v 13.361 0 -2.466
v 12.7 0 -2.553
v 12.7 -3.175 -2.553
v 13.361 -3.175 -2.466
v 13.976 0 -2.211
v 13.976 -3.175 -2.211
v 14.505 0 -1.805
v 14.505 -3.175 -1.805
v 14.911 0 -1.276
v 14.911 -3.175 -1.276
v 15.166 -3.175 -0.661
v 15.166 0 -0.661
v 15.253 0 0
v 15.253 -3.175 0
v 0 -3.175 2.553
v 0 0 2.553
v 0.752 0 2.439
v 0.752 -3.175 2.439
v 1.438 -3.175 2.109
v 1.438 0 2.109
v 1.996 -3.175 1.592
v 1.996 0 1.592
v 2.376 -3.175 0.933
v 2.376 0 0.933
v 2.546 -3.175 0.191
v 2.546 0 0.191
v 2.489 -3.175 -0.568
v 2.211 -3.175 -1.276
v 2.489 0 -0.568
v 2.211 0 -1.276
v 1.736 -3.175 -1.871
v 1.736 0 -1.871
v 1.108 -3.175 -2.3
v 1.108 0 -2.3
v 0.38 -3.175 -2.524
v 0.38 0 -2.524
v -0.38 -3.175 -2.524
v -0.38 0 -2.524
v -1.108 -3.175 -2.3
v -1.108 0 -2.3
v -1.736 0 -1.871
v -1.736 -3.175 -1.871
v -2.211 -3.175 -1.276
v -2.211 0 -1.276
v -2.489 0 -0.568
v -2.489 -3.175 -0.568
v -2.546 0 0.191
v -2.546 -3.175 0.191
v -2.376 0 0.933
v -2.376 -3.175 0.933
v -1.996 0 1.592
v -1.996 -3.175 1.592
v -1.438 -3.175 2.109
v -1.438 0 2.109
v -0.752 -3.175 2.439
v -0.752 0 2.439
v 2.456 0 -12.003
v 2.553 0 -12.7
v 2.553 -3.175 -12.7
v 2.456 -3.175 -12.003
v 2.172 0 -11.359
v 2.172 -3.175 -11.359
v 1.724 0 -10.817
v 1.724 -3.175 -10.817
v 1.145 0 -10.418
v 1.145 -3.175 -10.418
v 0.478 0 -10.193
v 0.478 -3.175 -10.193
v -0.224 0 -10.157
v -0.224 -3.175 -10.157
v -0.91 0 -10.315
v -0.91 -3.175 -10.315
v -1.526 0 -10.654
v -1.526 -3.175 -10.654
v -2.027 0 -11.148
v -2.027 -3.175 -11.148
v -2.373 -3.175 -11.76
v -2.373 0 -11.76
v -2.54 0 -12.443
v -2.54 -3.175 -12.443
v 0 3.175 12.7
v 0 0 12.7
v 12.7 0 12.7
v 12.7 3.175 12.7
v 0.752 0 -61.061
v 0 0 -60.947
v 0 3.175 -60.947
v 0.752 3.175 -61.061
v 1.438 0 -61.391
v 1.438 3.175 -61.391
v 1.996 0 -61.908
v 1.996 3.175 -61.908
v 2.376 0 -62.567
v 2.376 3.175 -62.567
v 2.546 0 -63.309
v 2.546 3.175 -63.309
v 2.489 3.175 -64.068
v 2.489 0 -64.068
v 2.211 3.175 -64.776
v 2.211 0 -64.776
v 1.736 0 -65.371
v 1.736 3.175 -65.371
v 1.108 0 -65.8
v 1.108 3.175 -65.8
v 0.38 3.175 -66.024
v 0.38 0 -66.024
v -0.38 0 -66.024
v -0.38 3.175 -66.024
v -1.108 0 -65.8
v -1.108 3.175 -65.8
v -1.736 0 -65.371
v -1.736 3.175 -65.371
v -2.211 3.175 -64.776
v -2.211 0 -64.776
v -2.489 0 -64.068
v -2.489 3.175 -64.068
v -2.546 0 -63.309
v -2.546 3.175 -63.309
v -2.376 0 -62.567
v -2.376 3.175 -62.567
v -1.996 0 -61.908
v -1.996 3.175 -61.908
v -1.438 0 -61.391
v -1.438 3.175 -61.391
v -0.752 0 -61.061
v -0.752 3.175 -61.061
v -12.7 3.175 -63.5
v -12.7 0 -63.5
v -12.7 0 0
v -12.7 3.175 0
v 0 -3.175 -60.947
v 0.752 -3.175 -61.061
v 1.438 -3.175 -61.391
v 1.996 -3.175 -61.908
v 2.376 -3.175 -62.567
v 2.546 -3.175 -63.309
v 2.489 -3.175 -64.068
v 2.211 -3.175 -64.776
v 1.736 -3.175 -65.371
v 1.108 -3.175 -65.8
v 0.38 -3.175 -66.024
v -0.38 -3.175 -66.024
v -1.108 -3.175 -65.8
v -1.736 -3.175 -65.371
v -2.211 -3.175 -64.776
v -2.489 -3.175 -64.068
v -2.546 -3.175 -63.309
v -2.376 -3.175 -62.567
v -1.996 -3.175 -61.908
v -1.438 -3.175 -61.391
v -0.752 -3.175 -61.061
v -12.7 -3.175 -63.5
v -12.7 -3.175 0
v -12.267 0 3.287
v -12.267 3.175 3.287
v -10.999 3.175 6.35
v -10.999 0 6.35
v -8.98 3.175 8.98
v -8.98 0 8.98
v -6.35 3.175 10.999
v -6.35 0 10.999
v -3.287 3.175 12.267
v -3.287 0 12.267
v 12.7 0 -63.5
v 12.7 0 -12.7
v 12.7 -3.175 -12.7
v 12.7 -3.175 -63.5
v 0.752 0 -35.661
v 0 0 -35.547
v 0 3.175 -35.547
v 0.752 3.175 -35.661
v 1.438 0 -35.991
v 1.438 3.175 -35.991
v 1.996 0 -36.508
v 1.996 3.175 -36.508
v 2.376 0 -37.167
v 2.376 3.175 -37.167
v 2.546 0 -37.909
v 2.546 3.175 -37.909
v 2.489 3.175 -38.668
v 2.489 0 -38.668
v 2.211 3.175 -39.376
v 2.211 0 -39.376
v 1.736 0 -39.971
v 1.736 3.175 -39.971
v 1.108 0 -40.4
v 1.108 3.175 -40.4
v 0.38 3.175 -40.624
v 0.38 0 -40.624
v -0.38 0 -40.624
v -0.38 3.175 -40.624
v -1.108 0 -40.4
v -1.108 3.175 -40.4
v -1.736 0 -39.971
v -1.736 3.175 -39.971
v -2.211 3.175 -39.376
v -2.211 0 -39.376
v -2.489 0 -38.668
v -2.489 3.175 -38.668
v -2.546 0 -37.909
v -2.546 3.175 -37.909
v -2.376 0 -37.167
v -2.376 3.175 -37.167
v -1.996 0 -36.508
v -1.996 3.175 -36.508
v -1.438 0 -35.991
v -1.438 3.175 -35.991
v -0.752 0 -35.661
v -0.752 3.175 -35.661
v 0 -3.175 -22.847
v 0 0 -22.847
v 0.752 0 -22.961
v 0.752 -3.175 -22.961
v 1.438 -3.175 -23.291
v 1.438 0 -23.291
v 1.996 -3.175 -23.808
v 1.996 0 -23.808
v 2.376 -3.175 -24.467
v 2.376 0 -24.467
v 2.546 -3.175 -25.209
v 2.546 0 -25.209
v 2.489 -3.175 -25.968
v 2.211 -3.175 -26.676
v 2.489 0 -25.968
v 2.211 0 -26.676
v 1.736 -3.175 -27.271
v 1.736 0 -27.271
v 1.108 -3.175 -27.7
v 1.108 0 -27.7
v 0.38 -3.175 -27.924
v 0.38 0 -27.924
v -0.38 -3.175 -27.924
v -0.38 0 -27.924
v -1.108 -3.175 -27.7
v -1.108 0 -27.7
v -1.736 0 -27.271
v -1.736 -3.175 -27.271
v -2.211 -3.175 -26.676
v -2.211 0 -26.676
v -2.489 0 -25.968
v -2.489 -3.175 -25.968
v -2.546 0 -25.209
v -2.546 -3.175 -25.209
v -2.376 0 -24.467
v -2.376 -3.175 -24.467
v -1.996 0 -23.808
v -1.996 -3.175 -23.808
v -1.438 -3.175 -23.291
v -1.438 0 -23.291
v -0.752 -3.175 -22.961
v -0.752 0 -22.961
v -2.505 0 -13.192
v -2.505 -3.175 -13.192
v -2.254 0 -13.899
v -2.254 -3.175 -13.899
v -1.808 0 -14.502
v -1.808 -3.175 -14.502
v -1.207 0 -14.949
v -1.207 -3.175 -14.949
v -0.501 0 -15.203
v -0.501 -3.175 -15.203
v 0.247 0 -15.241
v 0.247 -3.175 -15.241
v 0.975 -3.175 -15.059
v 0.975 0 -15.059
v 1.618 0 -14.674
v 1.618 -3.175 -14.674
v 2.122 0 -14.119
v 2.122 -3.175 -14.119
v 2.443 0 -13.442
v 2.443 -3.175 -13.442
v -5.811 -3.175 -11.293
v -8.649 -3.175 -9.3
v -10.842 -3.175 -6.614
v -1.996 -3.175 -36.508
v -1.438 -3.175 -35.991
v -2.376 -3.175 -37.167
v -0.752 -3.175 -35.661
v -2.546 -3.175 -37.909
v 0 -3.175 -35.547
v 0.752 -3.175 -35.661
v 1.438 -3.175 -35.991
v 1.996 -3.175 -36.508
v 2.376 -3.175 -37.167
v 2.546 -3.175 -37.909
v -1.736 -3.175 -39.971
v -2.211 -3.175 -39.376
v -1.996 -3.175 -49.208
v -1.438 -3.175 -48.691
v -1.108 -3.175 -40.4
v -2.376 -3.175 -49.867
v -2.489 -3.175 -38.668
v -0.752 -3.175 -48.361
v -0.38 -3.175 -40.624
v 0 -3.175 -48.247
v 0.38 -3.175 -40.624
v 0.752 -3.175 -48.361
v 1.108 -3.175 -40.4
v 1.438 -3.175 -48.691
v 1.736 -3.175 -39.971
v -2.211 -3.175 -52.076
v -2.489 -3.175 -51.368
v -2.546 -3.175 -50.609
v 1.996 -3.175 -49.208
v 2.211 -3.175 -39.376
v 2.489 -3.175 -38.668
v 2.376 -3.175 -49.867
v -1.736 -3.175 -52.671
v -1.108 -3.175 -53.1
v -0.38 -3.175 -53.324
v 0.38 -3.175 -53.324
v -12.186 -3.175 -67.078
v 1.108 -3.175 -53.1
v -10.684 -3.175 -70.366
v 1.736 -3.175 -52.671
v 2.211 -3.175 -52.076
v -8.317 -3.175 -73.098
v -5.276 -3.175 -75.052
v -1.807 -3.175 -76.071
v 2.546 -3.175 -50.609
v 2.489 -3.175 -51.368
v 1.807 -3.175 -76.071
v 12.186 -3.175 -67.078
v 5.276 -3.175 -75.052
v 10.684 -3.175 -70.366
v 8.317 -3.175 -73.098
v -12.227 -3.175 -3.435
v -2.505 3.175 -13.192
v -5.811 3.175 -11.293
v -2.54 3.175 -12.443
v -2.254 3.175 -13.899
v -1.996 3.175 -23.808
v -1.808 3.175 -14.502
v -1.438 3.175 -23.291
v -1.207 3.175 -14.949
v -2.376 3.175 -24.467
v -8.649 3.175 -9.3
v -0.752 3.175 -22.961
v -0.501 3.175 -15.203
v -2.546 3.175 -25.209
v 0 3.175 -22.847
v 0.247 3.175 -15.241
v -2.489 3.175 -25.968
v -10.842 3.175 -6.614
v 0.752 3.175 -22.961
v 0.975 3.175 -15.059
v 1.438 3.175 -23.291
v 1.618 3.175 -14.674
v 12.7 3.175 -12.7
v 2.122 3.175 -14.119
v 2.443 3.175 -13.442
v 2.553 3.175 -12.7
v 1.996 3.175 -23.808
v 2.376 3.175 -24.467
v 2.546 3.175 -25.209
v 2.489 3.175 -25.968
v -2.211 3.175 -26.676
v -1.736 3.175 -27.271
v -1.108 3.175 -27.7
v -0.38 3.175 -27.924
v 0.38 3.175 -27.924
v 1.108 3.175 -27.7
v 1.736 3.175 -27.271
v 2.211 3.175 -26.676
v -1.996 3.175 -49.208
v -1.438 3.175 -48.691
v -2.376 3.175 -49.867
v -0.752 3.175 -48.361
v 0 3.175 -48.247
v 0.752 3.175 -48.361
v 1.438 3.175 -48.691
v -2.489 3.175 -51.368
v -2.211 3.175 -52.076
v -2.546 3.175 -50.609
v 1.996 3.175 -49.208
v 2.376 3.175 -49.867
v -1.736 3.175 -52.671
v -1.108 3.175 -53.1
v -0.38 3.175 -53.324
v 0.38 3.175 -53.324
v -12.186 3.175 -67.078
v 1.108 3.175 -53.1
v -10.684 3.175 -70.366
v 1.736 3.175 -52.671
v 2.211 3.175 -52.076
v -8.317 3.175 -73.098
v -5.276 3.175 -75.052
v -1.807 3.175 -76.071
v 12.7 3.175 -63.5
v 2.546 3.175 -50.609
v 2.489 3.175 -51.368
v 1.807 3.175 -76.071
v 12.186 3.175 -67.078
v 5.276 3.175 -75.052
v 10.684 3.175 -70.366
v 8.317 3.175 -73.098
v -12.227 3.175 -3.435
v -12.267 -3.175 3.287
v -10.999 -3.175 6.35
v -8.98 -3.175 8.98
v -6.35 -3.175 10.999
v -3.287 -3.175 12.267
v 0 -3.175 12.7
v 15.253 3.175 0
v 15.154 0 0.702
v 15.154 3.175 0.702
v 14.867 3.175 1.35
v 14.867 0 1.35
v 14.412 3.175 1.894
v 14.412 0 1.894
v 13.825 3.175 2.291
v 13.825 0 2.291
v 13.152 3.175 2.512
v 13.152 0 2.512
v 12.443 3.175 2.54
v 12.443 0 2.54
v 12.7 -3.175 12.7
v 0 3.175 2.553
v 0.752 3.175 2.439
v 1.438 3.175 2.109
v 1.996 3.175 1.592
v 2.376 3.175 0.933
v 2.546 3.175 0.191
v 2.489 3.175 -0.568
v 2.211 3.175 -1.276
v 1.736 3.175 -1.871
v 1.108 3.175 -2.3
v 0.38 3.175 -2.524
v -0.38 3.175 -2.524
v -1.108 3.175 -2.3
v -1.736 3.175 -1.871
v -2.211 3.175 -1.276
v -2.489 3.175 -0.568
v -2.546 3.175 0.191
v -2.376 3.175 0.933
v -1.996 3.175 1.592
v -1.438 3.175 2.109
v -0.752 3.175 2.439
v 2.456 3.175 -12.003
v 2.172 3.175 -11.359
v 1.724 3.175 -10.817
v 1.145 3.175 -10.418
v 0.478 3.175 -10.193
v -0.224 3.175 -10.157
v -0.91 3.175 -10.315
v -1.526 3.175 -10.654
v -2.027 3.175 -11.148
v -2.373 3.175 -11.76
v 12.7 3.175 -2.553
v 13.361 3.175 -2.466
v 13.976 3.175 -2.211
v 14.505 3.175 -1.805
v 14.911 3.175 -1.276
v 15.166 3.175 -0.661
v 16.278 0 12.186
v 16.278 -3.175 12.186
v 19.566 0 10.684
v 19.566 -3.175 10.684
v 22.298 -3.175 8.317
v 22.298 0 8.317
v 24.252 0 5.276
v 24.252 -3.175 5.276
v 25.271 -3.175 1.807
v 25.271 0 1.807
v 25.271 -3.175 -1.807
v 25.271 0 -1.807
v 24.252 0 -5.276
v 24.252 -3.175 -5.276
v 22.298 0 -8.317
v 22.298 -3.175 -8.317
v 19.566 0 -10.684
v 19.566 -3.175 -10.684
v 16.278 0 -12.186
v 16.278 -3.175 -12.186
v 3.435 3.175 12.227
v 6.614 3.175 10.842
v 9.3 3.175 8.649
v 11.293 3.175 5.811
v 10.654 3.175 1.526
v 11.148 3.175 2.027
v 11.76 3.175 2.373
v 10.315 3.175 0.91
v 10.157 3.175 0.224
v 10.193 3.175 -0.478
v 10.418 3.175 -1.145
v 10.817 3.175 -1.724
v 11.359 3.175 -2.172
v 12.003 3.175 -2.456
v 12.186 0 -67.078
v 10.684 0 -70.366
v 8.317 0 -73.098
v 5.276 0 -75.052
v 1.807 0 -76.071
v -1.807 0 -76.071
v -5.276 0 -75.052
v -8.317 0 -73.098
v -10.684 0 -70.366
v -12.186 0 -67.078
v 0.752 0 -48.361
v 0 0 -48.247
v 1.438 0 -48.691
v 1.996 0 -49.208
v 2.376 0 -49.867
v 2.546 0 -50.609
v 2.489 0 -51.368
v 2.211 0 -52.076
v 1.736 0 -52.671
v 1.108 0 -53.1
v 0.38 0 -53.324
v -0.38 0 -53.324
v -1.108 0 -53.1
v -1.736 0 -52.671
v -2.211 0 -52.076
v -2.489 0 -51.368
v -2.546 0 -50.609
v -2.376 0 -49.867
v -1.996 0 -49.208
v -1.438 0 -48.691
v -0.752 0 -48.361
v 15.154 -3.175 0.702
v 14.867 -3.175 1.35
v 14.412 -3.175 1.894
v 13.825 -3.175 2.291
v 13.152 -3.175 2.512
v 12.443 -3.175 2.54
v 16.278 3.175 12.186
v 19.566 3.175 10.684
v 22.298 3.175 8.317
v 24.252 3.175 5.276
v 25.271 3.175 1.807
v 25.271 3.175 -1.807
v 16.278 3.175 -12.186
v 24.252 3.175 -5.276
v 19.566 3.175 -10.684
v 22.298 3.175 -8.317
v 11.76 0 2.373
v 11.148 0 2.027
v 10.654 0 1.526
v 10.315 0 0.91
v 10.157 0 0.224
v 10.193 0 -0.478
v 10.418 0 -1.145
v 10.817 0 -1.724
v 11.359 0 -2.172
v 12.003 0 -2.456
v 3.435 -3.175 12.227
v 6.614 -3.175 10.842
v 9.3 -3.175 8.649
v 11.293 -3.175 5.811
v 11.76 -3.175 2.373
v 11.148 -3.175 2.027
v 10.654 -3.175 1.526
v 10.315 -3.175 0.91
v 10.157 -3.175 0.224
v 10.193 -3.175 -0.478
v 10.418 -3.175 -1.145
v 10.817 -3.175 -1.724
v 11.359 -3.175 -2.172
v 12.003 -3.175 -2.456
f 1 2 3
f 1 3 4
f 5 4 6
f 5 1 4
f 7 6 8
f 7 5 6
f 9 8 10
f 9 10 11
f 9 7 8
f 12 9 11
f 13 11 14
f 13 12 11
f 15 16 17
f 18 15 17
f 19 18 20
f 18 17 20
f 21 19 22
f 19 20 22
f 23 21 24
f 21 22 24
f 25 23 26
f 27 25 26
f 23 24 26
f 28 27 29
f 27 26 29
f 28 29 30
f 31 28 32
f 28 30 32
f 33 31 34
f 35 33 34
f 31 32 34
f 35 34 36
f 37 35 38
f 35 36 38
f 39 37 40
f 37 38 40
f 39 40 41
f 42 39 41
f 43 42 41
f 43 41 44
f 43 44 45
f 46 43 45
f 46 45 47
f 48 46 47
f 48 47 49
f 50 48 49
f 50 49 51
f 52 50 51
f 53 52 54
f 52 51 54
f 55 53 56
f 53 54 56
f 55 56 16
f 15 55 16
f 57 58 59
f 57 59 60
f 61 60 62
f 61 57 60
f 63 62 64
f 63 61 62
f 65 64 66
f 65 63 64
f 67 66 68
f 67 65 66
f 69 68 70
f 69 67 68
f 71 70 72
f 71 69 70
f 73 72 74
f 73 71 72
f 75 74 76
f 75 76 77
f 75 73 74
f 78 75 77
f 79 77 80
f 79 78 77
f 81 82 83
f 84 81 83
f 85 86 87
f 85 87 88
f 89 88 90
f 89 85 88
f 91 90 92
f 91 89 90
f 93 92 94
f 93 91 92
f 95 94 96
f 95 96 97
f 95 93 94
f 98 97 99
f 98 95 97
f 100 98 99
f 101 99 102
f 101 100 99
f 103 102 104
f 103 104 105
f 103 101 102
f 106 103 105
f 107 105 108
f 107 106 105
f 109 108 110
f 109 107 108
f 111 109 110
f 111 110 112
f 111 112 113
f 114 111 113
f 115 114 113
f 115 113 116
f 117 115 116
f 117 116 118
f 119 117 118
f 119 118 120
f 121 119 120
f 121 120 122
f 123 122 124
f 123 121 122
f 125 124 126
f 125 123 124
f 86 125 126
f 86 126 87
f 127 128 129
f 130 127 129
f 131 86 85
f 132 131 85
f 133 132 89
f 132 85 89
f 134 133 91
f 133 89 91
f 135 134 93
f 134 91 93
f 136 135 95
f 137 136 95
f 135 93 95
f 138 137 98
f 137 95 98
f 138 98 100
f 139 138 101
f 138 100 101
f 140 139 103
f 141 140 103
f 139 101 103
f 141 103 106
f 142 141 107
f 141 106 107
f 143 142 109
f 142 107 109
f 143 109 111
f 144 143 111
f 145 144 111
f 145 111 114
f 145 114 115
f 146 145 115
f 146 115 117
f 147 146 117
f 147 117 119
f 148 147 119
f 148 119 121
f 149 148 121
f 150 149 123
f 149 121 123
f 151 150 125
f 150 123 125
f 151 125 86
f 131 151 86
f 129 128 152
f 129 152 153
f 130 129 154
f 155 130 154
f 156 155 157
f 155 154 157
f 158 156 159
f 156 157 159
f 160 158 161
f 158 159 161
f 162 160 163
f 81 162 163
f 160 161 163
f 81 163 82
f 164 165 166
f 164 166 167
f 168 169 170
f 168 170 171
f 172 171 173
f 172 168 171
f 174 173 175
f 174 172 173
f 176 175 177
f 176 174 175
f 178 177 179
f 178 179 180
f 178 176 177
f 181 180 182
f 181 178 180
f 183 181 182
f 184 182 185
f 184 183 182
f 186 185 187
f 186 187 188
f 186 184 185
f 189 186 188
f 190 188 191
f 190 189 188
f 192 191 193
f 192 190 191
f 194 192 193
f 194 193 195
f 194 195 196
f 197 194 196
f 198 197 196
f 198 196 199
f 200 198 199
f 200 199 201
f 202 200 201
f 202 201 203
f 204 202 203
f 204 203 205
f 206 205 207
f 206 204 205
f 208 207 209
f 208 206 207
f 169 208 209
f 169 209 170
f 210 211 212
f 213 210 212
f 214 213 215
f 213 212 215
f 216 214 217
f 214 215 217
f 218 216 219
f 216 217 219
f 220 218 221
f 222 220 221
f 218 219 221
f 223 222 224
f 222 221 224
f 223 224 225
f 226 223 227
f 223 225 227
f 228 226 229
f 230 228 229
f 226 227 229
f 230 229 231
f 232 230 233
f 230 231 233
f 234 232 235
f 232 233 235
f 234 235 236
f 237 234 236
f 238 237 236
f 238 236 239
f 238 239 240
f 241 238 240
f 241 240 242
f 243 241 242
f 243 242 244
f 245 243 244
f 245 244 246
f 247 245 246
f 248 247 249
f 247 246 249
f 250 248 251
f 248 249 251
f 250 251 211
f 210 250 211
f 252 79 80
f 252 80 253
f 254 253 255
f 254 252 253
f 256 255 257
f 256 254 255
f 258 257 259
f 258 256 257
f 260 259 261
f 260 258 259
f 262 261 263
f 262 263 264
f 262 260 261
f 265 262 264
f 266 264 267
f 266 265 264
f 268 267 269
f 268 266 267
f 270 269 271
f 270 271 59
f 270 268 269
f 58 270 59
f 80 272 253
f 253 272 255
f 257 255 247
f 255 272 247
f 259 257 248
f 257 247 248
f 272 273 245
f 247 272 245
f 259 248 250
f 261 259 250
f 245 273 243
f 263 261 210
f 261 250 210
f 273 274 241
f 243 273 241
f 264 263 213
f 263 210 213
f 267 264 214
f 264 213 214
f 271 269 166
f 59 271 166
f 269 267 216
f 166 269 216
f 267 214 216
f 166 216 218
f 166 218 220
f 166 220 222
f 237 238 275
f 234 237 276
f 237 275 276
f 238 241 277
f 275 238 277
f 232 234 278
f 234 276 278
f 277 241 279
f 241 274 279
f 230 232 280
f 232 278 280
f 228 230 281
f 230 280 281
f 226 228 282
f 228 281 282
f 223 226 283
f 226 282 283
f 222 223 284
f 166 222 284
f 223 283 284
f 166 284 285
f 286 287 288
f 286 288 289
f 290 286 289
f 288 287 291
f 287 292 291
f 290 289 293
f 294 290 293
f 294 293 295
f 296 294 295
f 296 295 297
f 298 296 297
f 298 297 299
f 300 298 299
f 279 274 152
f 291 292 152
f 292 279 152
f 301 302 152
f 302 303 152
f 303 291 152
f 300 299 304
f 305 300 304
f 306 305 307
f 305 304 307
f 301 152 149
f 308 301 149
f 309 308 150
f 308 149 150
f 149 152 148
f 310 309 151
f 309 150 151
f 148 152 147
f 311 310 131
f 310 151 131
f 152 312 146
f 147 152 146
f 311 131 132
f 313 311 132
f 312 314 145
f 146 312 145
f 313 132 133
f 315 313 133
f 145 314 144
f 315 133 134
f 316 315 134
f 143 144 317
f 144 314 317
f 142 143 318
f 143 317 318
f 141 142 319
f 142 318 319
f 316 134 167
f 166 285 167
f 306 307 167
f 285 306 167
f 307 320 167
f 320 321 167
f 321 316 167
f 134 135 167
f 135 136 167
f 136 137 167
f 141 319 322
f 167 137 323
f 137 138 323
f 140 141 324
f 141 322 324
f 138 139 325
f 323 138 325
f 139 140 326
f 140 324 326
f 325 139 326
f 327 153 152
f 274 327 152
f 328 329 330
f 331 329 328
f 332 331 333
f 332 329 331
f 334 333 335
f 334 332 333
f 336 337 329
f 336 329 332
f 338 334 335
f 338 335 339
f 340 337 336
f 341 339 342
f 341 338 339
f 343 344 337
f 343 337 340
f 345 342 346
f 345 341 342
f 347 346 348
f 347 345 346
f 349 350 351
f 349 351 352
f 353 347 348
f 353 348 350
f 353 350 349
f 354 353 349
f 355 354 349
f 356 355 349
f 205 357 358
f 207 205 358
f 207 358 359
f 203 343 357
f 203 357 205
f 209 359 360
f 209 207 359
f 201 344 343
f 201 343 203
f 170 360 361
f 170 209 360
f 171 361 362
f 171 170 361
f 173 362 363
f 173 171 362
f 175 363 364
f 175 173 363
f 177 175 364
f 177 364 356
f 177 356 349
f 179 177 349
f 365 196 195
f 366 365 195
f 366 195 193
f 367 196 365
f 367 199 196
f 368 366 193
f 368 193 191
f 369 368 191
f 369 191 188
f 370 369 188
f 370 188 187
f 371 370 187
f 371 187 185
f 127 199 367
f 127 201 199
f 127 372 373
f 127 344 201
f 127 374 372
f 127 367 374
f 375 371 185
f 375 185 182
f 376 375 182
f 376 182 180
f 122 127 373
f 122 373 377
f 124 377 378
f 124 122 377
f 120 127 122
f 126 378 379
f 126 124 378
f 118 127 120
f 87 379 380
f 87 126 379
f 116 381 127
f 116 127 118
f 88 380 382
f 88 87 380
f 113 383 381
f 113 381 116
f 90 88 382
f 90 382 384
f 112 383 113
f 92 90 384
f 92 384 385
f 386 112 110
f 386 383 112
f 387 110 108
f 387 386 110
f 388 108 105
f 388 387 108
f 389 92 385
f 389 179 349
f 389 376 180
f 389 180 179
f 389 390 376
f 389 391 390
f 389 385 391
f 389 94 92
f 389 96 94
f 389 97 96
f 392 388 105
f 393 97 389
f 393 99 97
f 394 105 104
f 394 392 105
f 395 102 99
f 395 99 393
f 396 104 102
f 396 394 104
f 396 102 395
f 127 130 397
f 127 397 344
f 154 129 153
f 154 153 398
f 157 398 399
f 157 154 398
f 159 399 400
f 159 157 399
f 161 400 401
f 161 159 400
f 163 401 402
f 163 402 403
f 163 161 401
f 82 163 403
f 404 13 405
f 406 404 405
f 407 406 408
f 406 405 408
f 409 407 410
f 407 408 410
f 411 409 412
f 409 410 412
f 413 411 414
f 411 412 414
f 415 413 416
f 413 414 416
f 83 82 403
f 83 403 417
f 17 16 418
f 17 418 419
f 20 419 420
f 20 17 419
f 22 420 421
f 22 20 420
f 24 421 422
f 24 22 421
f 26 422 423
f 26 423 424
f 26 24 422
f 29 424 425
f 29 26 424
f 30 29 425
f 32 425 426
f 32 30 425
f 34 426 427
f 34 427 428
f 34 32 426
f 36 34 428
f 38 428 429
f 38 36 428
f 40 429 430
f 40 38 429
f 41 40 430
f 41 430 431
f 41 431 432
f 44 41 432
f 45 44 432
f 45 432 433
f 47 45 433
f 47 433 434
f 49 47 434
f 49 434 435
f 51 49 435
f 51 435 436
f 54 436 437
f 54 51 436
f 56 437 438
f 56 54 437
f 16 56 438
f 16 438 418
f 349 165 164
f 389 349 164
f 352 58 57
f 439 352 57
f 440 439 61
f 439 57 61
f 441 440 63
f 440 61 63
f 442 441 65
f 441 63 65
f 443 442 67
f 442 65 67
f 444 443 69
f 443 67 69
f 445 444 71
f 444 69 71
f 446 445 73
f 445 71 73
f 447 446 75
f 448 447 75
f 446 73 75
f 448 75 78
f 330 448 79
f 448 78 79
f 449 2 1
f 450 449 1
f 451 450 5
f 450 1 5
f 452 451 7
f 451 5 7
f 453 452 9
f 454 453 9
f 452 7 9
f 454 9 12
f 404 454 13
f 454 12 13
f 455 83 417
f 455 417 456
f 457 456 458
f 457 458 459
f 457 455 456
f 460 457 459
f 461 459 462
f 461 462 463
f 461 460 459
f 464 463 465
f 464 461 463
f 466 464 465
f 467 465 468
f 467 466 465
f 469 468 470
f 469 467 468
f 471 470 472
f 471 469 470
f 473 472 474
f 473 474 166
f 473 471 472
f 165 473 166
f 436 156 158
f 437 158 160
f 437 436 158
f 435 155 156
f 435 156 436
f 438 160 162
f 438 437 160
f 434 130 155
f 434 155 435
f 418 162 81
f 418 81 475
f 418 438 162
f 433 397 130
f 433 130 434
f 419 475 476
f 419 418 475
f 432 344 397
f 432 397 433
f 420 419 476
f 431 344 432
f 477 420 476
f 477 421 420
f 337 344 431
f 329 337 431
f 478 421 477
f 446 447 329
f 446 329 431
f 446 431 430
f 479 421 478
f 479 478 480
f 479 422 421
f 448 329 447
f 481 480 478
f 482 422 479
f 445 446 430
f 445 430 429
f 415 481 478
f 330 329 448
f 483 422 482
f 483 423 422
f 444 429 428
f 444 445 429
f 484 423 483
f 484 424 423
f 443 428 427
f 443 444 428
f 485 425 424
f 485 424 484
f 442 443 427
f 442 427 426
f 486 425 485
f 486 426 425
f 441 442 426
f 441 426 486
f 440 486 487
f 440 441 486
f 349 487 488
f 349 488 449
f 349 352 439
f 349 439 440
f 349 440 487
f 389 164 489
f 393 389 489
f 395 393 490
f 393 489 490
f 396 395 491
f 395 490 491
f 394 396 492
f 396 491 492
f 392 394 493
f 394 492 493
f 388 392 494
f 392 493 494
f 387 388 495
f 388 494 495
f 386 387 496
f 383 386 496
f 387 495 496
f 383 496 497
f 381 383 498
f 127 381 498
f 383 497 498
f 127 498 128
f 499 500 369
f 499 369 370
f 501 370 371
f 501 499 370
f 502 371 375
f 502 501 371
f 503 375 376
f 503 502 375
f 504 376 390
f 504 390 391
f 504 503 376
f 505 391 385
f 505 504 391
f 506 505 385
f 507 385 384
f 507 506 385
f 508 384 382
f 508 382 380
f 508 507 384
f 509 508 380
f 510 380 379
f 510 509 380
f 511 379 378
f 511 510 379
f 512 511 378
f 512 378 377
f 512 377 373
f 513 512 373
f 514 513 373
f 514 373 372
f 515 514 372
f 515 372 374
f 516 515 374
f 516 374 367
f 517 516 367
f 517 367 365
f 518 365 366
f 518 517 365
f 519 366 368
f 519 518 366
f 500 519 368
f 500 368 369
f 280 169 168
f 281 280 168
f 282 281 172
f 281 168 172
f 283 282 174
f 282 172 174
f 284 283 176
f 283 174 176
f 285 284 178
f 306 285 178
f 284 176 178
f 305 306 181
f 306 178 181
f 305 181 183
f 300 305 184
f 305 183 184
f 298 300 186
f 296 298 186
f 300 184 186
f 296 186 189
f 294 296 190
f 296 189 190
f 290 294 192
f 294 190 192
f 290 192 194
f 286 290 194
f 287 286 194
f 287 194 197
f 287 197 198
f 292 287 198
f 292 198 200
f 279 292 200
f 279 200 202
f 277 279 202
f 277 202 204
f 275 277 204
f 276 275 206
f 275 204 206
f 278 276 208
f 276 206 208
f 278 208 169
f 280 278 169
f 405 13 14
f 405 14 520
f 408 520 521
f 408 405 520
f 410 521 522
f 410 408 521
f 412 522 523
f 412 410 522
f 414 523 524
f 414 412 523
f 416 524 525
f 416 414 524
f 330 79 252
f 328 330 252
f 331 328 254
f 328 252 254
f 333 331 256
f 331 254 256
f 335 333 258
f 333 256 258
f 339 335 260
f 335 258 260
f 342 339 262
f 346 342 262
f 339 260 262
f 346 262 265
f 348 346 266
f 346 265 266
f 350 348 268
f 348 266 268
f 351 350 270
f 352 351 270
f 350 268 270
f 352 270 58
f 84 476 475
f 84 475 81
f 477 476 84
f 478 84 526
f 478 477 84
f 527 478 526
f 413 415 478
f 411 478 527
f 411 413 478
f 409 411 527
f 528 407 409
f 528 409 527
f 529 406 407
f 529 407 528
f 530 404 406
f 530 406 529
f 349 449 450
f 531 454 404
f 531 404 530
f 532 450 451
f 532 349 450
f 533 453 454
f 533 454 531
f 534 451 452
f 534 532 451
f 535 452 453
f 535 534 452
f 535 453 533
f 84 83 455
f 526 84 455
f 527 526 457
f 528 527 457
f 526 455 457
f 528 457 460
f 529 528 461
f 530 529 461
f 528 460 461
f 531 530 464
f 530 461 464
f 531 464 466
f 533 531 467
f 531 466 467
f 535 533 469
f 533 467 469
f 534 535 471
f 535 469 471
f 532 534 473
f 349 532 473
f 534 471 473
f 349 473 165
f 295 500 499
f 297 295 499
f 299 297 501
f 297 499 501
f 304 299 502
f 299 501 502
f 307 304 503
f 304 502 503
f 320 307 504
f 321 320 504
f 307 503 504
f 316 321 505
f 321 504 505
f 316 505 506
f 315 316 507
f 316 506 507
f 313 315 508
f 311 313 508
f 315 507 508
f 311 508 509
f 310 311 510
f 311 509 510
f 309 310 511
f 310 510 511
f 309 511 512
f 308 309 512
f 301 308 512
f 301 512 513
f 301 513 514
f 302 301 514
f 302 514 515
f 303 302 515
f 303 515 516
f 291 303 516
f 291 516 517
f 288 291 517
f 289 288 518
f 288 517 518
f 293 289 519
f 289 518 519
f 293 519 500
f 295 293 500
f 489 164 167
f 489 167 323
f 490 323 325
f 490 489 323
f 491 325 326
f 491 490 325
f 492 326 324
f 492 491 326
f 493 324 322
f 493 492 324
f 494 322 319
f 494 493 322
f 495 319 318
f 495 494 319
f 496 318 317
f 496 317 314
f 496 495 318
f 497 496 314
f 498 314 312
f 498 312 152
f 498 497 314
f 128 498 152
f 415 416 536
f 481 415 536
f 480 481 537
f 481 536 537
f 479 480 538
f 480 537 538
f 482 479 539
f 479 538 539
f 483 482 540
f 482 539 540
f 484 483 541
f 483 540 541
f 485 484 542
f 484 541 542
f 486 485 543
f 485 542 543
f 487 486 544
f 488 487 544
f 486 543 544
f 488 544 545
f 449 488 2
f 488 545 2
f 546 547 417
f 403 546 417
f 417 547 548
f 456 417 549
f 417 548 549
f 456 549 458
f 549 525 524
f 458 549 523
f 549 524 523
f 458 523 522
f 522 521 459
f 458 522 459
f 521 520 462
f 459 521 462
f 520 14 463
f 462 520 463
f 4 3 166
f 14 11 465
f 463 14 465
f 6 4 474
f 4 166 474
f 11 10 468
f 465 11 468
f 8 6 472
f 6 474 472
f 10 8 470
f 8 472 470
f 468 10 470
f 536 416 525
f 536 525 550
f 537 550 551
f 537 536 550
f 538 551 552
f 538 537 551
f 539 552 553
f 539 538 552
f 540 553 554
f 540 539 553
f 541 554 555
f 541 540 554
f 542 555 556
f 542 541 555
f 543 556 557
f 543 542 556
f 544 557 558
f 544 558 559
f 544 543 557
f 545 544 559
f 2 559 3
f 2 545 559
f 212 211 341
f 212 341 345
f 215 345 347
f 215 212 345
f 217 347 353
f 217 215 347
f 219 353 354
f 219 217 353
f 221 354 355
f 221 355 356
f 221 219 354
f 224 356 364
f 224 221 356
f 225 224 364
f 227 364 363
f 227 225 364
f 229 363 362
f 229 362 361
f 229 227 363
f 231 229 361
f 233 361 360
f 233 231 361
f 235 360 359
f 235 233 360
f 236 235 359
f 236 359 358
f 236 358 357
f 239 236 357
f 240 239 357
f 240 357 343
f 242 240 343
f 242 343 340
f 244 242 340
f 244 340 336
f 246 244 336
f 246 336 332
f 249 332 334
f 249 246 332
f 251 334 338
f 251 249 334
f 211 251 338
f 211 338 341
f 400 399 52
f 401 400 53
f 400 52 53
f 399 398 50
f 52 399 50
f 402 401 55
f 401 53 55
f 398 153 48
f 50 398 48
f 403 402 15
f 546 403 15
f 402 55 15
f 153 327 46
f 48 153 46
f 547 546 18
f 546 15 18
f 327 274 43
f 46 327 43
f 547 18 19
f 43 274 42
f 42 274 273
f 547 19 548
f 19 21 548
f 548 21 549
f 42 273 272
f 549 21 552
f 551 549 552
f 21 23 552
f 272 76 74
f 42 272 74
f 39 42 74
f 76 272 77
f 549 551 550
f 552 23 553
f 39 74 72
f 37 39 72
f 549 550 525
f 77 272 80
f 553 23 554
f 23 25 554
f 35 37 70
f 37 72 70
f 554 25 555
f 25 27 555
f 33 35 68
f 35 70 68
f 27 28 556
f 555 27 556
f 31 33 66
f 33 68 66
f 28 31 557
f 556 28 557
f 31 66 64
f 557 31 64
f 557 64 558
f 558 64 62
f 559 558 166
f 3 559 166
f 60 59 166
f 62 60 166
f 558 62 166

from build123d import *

# Parameters (mm, degrees)
SKETCH1_R           = 2.5527
BOSS_EXTRUDE1_DEPTH = 3.175


with BuildPart() as part:
    # Sketch1 → Boss-Extrude1 (new, symmetric)
    # profile 1 of 3: a face of its own
    with BuildSketch(Plane(origin=(0, 0, 0), x_dir=(1, 0, 0), z_dir=(0, 1, 0))):
        with BuildLine():
            Line((0, -12.7), (12.7, -12.7))
            ThreePointArc((12.7, -12.7), (25.4, 0), (12.7, 12.7))
            Line((12.7, 12.7), (12.7, 2.5527))
            ThreePointArc((12.7, 2.5527), (14.50503148, 1.80503148), (15.2527, 0))
            ThreePointArc((15.2527, 0), (14.411927484, -1.893563196), (12.44345365, -2.539775829))
            ThreePointArc((12.44345365, -2.539775829), (8.032273868, -9.837305348), (0, -12.7))
        make_face()
    # profile 2 of 3: a face of its own
    with BuildSketch(Plane(origin=(0, 0, 0), x_dir=(1, 0, 0), z_dir=(0, 1, 0))):
        with BuildLine():
            ThreePointArc((-12.7, 0), (-8.980256121, -8.980256121), (0, -12.7))
            ThreePointArc((0, -12.7), (8.032273868, -9.837305348), (12.44345365, -2.539775829))
            ThreePointArc((12.44345365, -2.539775829), (10.15053309, 0.128435844), (12.7, 2.5527))
            Line((12.7, 2.5527), (12.7, 12.7))
            Line((12.7, 12.7), (2.5527, 12.7))
            ThreePointArc((2.5527, 12.7), (0.128435844, 10.15053309), (-2.539775829, 12.44345365))
            ThreePointArc((-2.539775829, 12.44345365), (-9.837305348, 8.032273868), (-12.7, 0))
        make_face()
        with Locations(Location((0, 0, 0), (0, 0, 270))):
            Circle(SKETCH1_R, mode=Mode.SUBTRACT)
    # profile 3 of 3: a face of its own
    with BuildSketch(Plane(origin=(0, 0, 0), x_dir=(1, 0, 0), z_dir=(0, 1, 0))):
        with BuildLine():
            Line((2.5527, 12.7), (12.7, 12.7))
            Line((12.7, 12.7), (12.7, 63.5))
            ThreePointArc((12.7, 63.5), (0, 76.2), (-12.7, 63.5))
            Line((-12.7, 63.5), (-12.7, 0))
            ThreePointArc((-12.7, 0), (-9.837305348, 8.032273868), (-2.539775829, 12.44345365))
            ThreePointArc((-2.539775829, 12.44345365), (-0.128435844, 15.24946691), (2.5527, 12.7))
        make_face()
        with Locations(Location((0, 25.4, 0), (0, 0, 270))):
            Circle(SKETCH1_R, mode=Mode.SUBTRACT)
        with Locations(Location((0, 38.1, 0), (0, 0, 270))):
            Circle(SKETCH1_R, mode=Mode.SUBTRACT)
        with Locations(Location((0, 50.8, 0), (0, 0, 270))):
            Circle(SKETCH1_R, mode=Mode.SUBTRACT)
        with Locations(Location((0, 63.5, 0), (0, 0, 270))):
            Circle(SKETCH1_R, mode=Mode.SUBTRACT)
    extrude(amount=BOSS_EXTRUDE1_DEPTH, both=True)


solid = part.part
